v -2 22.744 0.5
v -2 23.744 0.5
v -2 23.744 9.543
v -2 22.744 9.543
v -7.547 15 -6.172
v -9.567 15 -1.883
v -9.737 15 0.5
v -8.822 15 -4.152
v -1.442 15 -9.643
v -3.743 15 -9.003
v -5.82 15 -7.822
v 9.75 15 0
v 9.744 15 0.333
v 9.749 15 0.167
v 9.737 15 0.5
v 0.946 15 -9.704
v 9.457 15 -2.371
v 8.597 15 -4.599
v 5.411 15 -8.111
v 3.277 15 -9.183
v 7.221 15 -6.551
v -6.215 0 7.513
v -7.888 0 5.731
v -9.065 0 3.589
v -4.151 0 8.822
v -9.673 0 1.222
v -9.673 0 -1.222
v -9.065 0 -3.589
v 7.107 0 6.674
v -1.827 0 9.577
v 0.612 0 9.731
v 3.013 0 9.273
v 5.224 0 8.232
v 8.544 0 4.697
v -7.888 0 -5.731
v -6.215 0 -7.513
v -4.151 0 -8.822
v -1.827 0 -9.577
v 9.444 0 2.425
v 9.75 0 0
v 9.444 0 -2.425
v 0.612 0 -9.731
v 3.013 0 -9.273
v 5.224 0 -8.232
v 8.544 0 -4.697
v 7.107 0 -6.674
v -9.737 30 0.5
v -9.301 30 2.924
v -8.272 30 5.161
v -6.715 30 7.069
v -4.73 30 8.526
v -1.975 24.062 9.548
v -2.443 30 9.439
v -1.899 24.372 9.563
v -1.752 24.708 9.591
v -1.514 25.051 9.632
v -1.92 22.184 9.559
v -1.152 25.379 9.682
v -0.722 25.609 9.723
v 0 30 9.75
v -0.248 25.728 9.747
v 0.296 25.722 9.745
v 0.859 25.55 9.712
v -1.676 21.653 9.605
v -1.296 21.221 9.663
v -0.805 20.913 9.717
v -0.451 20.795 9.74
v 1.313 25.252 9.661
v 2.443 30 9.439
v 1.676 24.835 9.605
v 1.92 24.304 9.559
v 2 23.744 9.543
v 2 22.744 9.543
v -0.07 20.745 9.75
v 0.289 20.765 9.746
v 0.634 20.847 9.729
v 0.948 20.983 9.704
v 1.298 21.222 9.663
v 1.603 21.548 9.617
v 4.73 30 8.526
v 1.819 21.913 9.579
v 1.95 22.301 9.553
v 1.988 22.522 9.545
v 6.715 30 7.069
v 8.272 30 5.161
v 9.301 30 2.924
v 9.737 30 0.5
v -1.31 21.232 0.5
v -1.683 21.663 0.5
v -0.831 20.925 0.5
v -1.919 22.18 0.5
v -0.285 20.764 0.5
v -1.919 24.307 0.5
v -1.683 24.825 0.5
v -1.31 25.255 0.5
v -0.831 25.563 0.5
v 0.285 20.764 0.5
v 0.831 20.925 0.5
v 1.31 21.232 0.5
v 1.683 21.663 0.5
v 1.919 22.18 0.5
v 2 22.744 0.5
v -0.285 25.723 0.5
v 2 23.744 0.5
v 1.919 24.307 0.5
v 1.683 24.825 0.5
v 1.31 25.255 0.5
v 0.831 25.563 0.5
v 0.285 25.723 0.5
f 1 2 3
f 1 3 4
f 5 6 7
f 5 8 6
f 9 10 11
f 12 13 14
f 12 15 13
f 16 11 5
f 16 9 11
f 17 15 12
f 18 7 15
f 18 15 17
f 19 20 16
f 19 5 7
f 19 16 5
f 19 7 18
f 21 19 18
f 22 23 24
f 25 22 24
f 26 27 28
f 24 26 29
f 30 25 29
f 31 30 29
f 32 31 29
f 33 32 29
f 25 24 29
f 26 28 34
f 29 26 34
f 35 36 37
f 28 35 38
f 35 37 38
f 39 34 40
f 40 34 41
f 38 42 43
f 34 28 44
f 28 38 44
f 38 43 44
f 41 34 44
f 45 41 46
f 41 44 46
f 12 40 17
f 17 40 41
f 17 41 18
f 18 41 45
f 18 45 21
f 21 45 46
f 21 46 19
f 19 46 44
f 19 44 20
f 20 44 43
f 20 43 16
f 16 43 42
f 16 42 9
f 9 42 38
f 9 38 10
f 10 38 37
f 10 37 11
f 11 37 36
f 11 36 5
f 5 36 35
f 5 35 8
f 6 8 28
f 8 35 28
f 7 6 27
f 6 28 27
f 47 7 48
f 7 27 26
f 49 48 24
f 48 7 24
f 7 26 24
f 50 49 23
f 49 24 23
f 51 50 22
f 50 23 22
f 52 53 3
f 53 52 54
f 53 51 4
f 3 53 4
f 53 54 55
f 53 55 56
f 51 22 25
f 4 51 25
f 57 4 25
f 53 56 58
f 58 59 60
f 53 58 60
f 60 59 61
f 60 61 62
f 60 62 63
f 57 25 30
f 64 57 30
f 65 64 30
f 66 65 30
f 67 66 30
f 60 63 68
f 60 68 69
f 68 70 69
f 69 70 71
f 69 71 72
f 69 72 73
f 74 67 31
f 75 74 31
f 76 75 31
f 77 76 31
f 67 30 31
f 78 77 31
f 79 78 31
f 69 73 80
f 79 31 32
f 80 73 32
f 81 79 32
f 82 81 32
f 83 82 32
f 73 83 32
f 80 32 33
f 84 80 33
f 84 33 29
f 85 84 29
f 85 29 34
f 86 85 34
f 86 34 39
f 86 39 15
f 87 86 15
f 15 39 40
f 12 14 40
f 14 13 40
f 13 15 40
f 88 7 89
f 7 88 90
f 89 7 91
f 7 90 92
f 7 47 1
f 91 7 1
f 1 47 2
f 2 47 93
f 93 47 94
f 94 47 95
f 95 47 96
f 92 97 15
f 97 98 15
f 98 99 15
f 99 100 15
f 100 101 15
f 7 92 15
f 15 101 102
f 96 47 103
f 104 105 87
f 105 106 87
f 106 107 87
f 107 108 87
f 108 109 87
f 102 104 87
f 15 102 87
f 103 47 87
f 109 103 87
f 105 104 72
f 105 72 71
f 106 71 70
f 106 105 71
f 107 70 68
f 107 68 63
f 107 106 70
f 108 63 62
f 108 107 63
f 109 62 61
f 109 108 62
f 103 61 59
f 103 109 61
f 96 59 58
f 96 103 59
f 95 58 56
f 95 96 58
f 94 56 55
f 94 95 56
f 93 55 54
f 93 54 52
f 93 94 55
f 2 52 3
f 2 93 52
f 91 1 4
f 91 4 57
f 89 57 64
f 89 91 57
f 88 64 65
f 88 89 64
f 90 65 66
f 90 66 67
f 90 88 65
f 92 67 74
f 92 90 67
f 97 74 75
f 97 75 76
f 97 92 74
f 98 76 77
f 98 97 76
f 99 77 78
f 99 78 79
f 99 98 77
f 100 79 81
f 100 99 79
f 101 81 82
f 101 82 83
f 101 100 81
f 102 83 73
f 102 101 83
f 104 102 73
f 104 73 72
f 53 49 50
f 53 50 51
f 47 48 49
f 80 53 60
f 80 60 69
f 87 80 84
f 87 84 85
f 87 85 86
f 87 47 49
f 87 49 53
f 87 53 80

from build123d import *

# Parameters (mm, degrees)
SKETCH1_R               = 9.75
BOSS_EXTRUDE1_DEPTH     = 30
SKETCH3_W               = 19.5
SKETCH3_H               = 15
CUT_EXTRUDE1_DEPTH      = 0.5
CUT_EXTRUDE1_DEPTH_BACK = 30
CUT_EXTRUDE2_DEPTH      = 30


with BuildPart() as part:
    # Sketch1 → Boss-Extrude1 (new body)
    with BuildSketch(Plane(origin=(0, 0, 0), x_dir=(1, 0, 0), z_dir=(0, 1, 0))):
        Circle(SKETCH1_R)
    extrude(amount=BOSS_EXTRUDE1_DEPTH)

    # Sketch3 → Cut-Extrude1 (cut, two sides)
    with BuildSketch(Plane.XY) as cut_extrude1_sk:
        with Locations((0, 22.5)):
            Rectangle(SKETCH3_W, SKETCH3_H)
    extrude(amount=CUT_EXTRUDE1_DEPTH, mode=Mode.SUBTRACT)
    extrude(cut_extrude1_sk.sketch, amount=-CUT_EXTRUDE1_DEPTH_BACK, mode=Mode.SUBTRACT)

    # Sketch4 → Cut-Extrude2 (cut)
    with BuildSketch(Plane(origin=(0, 0, 0.5), x_dir=(-1, 0, 0), z_dir=(0, 0, -1))):
        with BuildLine():
            Line((2, 23.743843632), (2, 22.743843632))
            ThreePointArc((2, 22.743843632), (0, 20.743843632), (-2, 22.743843632))
            Line((-2, 22.743843632), (-2, 23.743843632))
            ThreePointArc((-2, 23.743843632), (0, 25.743843632), (2, 23.743843632))
        make_face()
    extrude(amount=-CUT_EXTRUDE2_DEPTH, mode=Mode.SUBTRACT)


solid = part.part
